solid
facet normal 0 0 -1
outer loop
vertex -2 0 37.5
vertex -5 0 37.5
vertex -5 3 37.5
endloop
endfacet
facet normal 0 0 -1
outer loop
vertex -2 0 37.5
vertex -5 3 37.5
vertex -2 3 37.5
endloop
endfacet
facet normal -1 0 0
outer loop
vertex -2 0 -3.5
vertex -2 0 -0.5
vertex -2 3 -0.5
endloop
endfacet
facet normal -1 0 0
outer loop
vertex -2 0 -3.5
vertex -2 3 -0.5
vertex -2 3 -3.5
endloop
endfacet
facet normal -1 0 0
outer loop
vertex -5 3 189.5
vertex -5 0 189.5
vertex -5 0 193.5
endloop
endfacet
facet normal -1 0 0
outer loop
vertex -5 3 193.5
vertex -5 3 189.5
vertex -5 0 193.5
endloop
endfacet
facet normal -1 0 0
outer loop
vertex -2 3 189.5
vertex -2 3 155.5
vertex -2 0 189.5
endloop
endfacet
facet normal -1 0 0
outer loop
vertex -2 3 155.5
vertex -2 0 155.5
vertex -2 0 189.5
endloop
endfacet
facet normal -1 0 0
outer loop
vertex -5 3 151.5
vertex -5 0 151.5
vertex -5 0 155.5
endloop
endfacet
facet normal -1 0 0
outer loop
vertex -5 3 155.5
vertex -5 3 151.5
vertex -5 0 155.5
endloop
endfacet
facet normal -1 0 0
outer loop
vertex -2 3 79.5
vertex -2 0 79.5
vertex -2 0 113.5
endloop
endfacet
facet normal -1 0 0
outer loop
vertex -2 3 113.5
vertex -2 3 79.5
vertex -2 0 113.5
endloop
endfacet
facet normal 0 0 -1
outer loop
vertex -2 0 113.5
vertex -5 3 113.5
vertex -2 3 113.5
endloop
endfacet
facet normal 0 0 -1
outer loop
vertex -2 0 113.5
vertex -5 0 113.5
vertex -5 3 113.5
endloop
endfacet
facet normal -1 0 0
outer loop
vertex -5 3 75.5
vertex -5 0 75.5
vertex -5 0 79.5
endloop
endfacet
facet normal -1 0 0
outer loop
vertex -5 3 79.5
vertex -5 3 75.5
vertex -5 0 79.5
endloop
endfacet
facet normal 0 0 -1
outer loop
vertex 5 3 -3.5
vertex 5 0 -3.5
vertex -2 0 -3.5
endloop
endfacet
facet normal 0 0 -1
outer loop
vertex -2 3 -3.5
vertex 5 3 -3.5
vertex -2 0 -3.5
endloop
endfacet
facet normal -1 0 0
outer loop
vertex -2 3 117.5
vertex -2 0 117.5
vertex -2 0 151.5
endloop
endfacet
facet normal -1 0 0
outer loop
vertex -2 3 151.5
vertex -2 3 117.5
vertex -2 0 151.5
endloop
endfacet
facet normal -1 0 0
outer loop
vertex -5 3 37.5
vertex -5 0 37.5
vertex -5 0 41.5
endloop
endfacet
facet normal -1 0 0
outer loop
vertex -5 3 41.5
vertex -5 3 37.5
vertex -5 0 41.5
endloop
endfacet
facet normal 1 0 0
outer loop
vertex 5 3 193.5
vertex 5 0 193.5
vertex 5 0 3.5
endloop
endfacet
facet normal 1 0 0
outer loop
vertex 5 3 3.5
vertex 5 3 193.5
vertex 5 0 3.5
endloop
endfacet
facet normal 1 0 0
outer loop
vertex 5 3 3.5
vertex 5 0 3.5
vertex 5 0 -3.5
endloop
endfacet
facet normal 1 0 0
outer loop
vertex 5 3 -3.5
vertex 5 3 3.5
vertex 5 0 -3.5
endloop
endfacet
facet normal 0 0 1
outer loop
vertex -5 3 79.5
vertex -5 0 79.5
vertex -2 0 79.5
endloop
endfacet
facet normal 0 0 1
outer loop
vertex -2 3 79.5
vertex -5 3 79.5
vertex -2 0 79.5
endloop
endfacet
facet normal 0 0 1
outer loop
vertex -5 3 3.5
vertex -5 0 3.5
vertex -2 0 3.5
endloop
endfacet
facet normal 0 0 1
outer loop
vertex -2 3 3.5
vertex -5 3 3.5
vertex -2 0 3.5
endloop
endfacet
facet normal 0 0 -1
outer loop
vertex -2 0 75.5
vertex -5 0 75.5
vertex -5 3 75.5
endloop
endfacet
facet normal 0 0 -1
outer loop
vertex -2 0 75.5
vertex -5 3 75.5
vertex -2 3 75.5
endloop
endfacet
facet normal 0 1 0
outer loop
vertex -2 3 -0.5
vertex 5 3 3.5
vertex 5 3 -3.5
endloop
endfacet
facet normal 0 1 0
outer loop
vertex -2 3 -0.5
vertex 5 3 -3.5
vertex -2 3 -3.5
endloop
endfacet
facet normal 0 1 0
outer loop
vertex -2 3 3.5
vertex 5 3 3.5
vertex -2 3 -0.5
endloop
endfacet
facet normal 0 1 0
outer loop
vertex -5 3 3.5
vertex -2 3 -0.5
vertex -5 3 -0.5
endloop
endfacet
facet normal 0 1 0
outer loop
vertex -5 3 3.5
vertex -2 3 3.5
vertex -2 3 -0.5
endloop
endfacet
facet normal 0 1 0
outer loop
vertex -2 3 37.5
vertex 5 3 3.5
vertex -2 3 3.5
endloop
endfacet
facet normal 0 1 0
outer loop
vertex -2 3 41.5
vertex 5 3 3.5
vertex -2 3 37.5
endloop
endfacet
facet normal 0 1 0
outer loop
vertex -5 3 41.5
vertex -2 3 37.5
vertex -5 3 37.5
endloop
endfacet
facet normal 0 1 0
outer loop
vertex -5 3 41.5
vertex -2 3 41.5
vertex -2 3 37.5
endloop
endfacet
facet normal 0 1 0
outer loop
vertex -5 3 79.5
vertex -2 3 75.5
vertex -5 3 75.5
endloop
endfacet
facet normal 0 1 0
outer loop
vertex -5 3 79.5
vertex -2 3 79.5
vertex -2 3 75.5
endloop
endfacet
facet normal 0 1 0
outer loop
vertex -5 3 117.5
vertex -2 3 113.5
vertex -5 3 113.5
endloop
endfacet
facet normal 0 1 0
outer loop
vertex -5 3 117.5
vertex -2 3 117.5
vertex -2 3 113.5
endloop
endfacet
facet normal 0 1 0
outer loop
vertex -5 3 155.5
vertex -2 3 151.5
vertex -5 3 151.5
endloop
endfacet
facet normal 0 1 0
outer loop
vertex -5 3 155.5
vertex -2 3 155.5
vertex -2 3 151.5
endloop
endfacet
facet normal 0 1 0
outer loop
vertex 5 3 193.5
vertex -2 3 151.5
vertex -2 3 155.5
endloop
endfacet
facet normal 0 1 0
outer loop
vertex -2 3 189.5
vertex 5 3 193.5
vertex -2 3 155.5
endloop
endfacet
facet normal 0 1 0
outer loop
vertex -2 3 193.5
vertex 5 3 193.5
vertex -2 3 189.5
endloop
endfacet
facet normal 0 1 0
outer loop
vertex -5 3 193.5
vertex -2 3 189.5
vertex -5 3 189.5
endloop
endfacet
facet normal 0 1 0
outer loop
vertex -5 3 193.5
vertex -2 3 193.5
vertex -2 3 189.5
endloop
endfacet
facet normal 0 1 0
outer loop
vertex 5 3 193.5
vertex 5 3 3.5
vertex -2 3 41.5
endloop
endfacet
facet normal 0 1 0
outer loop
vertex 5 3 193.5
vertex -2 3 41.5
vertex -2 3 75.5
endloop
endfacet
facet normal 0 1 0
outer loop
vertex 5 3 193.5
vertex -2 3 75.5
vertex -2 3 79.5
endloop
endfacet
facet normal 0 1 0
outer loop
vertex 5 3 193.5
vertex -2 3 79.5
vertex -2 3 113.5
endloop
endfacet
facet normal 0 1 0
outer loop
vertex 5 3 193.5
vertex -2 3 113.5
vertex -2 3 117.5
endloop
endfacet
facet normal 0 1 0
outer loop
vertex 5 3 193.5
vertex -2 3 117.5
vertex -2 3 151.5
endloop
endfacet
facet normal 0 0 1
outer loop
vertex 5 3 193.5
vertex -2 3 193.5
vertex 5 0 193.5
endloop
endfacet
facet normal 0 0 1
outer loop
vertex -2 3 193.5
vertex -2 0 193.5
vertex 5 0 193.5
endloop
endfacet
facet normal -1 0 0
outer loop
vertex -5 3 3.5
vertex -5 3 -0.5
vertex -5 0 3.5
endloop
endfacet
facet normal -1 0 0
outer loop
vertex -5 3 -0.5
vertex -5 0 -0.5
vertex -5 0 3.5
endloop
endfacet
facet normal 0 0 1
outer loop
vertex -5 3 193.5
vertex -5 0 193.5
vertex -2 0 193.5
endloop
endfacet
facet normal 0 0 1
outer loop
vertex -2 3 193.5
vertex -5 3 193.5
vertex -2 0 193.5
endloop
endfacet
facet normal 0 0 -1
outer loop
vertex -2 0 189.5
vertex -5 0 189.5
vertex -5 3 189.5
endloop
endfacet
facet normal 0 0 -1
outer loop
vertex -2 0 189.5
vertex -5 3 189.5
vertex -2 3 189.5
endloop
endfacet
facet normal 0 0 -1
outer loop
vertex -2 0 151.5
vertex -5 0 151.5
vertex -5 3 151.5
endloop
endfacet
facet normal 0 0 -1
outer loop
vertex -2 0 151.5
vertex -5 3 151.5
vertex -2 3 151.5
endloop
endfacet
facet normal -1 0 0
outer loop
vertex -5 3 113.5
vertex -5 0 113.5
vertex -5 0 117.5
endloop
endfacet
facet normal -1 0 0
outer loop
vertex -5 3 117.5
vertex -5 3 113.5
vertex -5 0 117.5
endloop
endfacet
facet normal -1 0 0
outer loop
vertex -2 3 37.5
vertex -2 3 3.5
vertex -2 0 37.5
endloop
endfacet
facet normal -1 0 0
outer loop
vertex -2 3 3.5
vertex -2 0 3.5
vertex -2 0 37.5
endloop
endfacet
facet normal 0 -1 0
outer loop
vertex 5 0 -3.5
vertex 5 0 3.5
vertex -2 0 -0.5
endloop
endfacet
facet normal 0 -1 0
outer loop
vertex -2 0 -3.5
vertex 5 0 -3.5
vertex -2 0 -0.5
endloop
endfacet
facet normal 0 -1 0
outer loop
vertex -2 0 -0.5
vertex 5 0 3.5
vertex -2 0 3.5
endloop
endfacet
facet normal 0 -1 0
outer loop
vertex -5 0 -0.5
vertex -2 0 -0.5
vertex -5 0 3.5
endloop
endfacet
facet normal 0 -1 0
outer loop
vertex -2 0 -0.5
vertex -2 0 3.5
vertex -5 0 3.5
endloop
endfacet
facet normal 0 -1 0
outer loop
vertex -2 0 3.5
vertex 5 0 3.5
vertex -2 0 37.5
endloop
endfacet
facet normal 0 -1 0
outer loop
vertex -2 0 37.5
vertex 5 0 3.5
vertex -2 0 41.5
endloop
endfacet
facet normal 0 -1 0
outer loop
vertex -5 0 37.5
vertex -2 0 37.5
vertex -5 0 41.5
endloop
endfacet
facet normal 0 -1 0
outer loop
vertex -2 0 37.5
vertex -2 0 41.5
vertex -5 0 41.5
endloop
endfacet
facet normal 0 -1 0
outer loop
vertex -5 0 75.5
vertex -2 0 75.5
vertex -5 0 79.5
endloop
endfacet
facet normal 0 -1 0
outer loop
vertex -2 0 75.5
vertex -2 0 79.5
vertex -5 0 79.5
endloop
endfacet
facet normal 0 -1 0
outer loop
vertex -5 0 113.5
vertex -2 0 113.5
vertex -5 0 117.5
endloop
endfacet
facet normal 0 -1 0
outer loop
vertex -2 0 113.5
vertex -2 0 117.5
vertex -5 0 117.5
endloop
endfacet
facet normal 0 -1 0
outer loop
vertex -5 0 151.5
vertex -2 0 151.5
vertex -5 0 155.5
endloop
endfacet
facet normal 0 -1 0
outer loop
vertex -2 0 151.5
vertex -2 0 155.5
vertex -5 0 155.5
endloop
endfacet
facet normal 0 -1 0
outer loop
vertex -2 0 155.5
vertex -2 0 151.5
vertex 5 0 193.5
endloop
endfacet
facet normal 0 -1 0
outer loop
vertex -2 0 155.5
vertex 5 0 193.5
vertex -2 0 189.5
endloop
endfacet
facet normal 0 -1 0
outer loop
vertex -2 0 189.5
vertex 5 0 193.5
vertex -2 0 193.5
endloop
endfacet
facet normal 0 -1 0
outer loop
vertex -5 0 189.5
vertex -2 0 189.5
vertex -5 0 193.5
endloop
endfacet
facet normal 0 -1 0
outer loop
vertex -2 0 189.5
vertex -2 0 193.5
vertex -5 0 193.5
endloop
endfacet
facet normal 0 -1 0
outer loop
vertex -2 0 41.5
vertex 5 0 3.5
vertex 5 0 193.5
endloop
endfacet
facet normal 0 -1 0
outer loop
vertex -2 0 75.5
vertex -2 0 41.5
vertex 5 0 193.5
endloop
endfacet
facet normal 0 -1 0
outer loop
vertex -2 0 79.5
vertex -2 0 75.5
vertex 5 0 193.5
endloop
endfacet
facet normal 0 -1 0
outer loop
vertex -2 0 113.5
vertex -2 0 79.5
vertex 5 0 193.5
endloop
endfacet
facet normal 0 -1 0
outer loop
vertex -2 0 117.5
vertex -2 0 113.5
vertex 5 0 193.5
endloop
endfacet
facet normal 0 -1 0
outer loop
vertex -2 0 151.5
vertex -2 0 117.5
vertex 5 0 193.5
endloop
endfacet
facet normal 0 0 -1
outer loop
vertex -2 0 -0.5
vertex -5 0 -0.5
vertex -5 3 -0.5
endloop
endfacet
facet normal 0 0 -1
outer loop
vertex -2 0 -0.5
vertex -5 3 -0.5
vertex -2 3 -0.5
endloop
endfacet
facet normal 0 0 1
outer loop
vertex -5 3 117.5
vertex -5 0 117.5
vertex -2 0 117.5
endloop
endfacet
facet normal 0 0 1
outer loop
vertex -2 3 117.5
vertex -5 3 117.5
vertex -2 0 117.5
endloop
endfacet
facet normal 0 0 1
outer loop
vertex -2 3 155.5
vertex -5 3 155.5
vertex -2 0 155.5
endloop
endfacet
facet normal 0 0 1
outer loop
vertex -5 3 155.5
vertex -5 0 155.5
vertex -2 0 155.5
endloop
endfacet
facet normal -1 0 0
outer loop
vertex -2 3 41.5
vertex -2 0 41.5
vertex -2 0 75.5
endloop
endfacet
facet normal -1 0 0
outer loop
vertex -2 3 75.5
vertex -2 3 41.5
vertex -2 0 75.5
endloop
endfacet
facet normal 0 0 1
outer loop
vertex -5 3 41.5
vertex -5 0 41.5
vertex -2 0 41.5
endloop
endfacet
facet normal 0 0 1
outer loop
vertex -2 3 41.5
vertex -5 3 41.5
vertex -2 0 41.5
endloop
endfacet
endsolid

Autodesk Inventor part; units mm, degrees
ref_plane "YZ Plane" through (0, 0, 0) normal (1, 0, 0) x (0, 1, 0)
ref_plane "XZ Plane" through (0, 0, 0) normal (0, 1, 0) x (-1, 0, 0)
ref_plane "XY Plane" through (0, 0, 0) normal (0, 0, 1) x (1, 0, 0)
sketch "Sketch1" plane through (0, 0, 0) normal (0, 1, 0) x (-1, 0, 0)
  line L0 (-5, 3.5) -> (-5, -3.5)
  line L1 (-5, -3.5) -> (2, -3.5)
  line L2 (5, -0.5) -> (5, 3.5)
  line L3 (5, 3.5) -> (2, 3.5)
  line L4 (5, -0.5) -> (2, -0.5)
  line L5 (2, -0.5) -> (2, -3.5)
  line L6 (5, 37.5) -> (2, 37.5)
  line L7 (5, 37.5) -> (5, 41.5)
  line L8 (5, 41.5) -> (2, 41.5)
  line L9 (5, 75.5) -> (2, 75.5)
  line L10 (5, 75.5) -> (5, 79.5)
  line L11 (5, 79.5) -> (2, 79.5)
  line L12 (5, 113.5) -> (2, 113.5)
  line L13 (5, 113.5) -> (5, 117.5)
  line L14 (5, 117.5) -> (2, 117.5)
  line L15 (5, 151.5) -> (2, 151.5)
  line L16 (5, 151.5) -> (5, 155.5)
  line L17 (5, 155.5) -> (2, 155.5)
  line L18 (5, 189.5) -> (2, 189.5)
  line L19 (5, 189.5) -> (5, 193.5)
  line L20 (5, 193.5) -> (2, 193.5)
  line L21 (2, 3.5) -> (2, 37.5)
  line L22 (2, 41.5) -> (2, 75.5)
  line L23 (2, 79.5) -> (2, 113.5)
  line L24 (2, 117.5) -> (2, 151.5)
  line L25 (2, 155.5) -> (2, 189.5)
  line L26 (-5, 193.5) -> (-5, 3.5)
  line L27 (2, 193.5) -> (-5, 193.5)
  point P0 (0, 0)
  dimension "d10" = 3
  dimension "d18" = 38
extrude "Extrusion1" add sketch "Sketch1" along normal blind 3
properties part number "steun" material "Wood (Maple)"
